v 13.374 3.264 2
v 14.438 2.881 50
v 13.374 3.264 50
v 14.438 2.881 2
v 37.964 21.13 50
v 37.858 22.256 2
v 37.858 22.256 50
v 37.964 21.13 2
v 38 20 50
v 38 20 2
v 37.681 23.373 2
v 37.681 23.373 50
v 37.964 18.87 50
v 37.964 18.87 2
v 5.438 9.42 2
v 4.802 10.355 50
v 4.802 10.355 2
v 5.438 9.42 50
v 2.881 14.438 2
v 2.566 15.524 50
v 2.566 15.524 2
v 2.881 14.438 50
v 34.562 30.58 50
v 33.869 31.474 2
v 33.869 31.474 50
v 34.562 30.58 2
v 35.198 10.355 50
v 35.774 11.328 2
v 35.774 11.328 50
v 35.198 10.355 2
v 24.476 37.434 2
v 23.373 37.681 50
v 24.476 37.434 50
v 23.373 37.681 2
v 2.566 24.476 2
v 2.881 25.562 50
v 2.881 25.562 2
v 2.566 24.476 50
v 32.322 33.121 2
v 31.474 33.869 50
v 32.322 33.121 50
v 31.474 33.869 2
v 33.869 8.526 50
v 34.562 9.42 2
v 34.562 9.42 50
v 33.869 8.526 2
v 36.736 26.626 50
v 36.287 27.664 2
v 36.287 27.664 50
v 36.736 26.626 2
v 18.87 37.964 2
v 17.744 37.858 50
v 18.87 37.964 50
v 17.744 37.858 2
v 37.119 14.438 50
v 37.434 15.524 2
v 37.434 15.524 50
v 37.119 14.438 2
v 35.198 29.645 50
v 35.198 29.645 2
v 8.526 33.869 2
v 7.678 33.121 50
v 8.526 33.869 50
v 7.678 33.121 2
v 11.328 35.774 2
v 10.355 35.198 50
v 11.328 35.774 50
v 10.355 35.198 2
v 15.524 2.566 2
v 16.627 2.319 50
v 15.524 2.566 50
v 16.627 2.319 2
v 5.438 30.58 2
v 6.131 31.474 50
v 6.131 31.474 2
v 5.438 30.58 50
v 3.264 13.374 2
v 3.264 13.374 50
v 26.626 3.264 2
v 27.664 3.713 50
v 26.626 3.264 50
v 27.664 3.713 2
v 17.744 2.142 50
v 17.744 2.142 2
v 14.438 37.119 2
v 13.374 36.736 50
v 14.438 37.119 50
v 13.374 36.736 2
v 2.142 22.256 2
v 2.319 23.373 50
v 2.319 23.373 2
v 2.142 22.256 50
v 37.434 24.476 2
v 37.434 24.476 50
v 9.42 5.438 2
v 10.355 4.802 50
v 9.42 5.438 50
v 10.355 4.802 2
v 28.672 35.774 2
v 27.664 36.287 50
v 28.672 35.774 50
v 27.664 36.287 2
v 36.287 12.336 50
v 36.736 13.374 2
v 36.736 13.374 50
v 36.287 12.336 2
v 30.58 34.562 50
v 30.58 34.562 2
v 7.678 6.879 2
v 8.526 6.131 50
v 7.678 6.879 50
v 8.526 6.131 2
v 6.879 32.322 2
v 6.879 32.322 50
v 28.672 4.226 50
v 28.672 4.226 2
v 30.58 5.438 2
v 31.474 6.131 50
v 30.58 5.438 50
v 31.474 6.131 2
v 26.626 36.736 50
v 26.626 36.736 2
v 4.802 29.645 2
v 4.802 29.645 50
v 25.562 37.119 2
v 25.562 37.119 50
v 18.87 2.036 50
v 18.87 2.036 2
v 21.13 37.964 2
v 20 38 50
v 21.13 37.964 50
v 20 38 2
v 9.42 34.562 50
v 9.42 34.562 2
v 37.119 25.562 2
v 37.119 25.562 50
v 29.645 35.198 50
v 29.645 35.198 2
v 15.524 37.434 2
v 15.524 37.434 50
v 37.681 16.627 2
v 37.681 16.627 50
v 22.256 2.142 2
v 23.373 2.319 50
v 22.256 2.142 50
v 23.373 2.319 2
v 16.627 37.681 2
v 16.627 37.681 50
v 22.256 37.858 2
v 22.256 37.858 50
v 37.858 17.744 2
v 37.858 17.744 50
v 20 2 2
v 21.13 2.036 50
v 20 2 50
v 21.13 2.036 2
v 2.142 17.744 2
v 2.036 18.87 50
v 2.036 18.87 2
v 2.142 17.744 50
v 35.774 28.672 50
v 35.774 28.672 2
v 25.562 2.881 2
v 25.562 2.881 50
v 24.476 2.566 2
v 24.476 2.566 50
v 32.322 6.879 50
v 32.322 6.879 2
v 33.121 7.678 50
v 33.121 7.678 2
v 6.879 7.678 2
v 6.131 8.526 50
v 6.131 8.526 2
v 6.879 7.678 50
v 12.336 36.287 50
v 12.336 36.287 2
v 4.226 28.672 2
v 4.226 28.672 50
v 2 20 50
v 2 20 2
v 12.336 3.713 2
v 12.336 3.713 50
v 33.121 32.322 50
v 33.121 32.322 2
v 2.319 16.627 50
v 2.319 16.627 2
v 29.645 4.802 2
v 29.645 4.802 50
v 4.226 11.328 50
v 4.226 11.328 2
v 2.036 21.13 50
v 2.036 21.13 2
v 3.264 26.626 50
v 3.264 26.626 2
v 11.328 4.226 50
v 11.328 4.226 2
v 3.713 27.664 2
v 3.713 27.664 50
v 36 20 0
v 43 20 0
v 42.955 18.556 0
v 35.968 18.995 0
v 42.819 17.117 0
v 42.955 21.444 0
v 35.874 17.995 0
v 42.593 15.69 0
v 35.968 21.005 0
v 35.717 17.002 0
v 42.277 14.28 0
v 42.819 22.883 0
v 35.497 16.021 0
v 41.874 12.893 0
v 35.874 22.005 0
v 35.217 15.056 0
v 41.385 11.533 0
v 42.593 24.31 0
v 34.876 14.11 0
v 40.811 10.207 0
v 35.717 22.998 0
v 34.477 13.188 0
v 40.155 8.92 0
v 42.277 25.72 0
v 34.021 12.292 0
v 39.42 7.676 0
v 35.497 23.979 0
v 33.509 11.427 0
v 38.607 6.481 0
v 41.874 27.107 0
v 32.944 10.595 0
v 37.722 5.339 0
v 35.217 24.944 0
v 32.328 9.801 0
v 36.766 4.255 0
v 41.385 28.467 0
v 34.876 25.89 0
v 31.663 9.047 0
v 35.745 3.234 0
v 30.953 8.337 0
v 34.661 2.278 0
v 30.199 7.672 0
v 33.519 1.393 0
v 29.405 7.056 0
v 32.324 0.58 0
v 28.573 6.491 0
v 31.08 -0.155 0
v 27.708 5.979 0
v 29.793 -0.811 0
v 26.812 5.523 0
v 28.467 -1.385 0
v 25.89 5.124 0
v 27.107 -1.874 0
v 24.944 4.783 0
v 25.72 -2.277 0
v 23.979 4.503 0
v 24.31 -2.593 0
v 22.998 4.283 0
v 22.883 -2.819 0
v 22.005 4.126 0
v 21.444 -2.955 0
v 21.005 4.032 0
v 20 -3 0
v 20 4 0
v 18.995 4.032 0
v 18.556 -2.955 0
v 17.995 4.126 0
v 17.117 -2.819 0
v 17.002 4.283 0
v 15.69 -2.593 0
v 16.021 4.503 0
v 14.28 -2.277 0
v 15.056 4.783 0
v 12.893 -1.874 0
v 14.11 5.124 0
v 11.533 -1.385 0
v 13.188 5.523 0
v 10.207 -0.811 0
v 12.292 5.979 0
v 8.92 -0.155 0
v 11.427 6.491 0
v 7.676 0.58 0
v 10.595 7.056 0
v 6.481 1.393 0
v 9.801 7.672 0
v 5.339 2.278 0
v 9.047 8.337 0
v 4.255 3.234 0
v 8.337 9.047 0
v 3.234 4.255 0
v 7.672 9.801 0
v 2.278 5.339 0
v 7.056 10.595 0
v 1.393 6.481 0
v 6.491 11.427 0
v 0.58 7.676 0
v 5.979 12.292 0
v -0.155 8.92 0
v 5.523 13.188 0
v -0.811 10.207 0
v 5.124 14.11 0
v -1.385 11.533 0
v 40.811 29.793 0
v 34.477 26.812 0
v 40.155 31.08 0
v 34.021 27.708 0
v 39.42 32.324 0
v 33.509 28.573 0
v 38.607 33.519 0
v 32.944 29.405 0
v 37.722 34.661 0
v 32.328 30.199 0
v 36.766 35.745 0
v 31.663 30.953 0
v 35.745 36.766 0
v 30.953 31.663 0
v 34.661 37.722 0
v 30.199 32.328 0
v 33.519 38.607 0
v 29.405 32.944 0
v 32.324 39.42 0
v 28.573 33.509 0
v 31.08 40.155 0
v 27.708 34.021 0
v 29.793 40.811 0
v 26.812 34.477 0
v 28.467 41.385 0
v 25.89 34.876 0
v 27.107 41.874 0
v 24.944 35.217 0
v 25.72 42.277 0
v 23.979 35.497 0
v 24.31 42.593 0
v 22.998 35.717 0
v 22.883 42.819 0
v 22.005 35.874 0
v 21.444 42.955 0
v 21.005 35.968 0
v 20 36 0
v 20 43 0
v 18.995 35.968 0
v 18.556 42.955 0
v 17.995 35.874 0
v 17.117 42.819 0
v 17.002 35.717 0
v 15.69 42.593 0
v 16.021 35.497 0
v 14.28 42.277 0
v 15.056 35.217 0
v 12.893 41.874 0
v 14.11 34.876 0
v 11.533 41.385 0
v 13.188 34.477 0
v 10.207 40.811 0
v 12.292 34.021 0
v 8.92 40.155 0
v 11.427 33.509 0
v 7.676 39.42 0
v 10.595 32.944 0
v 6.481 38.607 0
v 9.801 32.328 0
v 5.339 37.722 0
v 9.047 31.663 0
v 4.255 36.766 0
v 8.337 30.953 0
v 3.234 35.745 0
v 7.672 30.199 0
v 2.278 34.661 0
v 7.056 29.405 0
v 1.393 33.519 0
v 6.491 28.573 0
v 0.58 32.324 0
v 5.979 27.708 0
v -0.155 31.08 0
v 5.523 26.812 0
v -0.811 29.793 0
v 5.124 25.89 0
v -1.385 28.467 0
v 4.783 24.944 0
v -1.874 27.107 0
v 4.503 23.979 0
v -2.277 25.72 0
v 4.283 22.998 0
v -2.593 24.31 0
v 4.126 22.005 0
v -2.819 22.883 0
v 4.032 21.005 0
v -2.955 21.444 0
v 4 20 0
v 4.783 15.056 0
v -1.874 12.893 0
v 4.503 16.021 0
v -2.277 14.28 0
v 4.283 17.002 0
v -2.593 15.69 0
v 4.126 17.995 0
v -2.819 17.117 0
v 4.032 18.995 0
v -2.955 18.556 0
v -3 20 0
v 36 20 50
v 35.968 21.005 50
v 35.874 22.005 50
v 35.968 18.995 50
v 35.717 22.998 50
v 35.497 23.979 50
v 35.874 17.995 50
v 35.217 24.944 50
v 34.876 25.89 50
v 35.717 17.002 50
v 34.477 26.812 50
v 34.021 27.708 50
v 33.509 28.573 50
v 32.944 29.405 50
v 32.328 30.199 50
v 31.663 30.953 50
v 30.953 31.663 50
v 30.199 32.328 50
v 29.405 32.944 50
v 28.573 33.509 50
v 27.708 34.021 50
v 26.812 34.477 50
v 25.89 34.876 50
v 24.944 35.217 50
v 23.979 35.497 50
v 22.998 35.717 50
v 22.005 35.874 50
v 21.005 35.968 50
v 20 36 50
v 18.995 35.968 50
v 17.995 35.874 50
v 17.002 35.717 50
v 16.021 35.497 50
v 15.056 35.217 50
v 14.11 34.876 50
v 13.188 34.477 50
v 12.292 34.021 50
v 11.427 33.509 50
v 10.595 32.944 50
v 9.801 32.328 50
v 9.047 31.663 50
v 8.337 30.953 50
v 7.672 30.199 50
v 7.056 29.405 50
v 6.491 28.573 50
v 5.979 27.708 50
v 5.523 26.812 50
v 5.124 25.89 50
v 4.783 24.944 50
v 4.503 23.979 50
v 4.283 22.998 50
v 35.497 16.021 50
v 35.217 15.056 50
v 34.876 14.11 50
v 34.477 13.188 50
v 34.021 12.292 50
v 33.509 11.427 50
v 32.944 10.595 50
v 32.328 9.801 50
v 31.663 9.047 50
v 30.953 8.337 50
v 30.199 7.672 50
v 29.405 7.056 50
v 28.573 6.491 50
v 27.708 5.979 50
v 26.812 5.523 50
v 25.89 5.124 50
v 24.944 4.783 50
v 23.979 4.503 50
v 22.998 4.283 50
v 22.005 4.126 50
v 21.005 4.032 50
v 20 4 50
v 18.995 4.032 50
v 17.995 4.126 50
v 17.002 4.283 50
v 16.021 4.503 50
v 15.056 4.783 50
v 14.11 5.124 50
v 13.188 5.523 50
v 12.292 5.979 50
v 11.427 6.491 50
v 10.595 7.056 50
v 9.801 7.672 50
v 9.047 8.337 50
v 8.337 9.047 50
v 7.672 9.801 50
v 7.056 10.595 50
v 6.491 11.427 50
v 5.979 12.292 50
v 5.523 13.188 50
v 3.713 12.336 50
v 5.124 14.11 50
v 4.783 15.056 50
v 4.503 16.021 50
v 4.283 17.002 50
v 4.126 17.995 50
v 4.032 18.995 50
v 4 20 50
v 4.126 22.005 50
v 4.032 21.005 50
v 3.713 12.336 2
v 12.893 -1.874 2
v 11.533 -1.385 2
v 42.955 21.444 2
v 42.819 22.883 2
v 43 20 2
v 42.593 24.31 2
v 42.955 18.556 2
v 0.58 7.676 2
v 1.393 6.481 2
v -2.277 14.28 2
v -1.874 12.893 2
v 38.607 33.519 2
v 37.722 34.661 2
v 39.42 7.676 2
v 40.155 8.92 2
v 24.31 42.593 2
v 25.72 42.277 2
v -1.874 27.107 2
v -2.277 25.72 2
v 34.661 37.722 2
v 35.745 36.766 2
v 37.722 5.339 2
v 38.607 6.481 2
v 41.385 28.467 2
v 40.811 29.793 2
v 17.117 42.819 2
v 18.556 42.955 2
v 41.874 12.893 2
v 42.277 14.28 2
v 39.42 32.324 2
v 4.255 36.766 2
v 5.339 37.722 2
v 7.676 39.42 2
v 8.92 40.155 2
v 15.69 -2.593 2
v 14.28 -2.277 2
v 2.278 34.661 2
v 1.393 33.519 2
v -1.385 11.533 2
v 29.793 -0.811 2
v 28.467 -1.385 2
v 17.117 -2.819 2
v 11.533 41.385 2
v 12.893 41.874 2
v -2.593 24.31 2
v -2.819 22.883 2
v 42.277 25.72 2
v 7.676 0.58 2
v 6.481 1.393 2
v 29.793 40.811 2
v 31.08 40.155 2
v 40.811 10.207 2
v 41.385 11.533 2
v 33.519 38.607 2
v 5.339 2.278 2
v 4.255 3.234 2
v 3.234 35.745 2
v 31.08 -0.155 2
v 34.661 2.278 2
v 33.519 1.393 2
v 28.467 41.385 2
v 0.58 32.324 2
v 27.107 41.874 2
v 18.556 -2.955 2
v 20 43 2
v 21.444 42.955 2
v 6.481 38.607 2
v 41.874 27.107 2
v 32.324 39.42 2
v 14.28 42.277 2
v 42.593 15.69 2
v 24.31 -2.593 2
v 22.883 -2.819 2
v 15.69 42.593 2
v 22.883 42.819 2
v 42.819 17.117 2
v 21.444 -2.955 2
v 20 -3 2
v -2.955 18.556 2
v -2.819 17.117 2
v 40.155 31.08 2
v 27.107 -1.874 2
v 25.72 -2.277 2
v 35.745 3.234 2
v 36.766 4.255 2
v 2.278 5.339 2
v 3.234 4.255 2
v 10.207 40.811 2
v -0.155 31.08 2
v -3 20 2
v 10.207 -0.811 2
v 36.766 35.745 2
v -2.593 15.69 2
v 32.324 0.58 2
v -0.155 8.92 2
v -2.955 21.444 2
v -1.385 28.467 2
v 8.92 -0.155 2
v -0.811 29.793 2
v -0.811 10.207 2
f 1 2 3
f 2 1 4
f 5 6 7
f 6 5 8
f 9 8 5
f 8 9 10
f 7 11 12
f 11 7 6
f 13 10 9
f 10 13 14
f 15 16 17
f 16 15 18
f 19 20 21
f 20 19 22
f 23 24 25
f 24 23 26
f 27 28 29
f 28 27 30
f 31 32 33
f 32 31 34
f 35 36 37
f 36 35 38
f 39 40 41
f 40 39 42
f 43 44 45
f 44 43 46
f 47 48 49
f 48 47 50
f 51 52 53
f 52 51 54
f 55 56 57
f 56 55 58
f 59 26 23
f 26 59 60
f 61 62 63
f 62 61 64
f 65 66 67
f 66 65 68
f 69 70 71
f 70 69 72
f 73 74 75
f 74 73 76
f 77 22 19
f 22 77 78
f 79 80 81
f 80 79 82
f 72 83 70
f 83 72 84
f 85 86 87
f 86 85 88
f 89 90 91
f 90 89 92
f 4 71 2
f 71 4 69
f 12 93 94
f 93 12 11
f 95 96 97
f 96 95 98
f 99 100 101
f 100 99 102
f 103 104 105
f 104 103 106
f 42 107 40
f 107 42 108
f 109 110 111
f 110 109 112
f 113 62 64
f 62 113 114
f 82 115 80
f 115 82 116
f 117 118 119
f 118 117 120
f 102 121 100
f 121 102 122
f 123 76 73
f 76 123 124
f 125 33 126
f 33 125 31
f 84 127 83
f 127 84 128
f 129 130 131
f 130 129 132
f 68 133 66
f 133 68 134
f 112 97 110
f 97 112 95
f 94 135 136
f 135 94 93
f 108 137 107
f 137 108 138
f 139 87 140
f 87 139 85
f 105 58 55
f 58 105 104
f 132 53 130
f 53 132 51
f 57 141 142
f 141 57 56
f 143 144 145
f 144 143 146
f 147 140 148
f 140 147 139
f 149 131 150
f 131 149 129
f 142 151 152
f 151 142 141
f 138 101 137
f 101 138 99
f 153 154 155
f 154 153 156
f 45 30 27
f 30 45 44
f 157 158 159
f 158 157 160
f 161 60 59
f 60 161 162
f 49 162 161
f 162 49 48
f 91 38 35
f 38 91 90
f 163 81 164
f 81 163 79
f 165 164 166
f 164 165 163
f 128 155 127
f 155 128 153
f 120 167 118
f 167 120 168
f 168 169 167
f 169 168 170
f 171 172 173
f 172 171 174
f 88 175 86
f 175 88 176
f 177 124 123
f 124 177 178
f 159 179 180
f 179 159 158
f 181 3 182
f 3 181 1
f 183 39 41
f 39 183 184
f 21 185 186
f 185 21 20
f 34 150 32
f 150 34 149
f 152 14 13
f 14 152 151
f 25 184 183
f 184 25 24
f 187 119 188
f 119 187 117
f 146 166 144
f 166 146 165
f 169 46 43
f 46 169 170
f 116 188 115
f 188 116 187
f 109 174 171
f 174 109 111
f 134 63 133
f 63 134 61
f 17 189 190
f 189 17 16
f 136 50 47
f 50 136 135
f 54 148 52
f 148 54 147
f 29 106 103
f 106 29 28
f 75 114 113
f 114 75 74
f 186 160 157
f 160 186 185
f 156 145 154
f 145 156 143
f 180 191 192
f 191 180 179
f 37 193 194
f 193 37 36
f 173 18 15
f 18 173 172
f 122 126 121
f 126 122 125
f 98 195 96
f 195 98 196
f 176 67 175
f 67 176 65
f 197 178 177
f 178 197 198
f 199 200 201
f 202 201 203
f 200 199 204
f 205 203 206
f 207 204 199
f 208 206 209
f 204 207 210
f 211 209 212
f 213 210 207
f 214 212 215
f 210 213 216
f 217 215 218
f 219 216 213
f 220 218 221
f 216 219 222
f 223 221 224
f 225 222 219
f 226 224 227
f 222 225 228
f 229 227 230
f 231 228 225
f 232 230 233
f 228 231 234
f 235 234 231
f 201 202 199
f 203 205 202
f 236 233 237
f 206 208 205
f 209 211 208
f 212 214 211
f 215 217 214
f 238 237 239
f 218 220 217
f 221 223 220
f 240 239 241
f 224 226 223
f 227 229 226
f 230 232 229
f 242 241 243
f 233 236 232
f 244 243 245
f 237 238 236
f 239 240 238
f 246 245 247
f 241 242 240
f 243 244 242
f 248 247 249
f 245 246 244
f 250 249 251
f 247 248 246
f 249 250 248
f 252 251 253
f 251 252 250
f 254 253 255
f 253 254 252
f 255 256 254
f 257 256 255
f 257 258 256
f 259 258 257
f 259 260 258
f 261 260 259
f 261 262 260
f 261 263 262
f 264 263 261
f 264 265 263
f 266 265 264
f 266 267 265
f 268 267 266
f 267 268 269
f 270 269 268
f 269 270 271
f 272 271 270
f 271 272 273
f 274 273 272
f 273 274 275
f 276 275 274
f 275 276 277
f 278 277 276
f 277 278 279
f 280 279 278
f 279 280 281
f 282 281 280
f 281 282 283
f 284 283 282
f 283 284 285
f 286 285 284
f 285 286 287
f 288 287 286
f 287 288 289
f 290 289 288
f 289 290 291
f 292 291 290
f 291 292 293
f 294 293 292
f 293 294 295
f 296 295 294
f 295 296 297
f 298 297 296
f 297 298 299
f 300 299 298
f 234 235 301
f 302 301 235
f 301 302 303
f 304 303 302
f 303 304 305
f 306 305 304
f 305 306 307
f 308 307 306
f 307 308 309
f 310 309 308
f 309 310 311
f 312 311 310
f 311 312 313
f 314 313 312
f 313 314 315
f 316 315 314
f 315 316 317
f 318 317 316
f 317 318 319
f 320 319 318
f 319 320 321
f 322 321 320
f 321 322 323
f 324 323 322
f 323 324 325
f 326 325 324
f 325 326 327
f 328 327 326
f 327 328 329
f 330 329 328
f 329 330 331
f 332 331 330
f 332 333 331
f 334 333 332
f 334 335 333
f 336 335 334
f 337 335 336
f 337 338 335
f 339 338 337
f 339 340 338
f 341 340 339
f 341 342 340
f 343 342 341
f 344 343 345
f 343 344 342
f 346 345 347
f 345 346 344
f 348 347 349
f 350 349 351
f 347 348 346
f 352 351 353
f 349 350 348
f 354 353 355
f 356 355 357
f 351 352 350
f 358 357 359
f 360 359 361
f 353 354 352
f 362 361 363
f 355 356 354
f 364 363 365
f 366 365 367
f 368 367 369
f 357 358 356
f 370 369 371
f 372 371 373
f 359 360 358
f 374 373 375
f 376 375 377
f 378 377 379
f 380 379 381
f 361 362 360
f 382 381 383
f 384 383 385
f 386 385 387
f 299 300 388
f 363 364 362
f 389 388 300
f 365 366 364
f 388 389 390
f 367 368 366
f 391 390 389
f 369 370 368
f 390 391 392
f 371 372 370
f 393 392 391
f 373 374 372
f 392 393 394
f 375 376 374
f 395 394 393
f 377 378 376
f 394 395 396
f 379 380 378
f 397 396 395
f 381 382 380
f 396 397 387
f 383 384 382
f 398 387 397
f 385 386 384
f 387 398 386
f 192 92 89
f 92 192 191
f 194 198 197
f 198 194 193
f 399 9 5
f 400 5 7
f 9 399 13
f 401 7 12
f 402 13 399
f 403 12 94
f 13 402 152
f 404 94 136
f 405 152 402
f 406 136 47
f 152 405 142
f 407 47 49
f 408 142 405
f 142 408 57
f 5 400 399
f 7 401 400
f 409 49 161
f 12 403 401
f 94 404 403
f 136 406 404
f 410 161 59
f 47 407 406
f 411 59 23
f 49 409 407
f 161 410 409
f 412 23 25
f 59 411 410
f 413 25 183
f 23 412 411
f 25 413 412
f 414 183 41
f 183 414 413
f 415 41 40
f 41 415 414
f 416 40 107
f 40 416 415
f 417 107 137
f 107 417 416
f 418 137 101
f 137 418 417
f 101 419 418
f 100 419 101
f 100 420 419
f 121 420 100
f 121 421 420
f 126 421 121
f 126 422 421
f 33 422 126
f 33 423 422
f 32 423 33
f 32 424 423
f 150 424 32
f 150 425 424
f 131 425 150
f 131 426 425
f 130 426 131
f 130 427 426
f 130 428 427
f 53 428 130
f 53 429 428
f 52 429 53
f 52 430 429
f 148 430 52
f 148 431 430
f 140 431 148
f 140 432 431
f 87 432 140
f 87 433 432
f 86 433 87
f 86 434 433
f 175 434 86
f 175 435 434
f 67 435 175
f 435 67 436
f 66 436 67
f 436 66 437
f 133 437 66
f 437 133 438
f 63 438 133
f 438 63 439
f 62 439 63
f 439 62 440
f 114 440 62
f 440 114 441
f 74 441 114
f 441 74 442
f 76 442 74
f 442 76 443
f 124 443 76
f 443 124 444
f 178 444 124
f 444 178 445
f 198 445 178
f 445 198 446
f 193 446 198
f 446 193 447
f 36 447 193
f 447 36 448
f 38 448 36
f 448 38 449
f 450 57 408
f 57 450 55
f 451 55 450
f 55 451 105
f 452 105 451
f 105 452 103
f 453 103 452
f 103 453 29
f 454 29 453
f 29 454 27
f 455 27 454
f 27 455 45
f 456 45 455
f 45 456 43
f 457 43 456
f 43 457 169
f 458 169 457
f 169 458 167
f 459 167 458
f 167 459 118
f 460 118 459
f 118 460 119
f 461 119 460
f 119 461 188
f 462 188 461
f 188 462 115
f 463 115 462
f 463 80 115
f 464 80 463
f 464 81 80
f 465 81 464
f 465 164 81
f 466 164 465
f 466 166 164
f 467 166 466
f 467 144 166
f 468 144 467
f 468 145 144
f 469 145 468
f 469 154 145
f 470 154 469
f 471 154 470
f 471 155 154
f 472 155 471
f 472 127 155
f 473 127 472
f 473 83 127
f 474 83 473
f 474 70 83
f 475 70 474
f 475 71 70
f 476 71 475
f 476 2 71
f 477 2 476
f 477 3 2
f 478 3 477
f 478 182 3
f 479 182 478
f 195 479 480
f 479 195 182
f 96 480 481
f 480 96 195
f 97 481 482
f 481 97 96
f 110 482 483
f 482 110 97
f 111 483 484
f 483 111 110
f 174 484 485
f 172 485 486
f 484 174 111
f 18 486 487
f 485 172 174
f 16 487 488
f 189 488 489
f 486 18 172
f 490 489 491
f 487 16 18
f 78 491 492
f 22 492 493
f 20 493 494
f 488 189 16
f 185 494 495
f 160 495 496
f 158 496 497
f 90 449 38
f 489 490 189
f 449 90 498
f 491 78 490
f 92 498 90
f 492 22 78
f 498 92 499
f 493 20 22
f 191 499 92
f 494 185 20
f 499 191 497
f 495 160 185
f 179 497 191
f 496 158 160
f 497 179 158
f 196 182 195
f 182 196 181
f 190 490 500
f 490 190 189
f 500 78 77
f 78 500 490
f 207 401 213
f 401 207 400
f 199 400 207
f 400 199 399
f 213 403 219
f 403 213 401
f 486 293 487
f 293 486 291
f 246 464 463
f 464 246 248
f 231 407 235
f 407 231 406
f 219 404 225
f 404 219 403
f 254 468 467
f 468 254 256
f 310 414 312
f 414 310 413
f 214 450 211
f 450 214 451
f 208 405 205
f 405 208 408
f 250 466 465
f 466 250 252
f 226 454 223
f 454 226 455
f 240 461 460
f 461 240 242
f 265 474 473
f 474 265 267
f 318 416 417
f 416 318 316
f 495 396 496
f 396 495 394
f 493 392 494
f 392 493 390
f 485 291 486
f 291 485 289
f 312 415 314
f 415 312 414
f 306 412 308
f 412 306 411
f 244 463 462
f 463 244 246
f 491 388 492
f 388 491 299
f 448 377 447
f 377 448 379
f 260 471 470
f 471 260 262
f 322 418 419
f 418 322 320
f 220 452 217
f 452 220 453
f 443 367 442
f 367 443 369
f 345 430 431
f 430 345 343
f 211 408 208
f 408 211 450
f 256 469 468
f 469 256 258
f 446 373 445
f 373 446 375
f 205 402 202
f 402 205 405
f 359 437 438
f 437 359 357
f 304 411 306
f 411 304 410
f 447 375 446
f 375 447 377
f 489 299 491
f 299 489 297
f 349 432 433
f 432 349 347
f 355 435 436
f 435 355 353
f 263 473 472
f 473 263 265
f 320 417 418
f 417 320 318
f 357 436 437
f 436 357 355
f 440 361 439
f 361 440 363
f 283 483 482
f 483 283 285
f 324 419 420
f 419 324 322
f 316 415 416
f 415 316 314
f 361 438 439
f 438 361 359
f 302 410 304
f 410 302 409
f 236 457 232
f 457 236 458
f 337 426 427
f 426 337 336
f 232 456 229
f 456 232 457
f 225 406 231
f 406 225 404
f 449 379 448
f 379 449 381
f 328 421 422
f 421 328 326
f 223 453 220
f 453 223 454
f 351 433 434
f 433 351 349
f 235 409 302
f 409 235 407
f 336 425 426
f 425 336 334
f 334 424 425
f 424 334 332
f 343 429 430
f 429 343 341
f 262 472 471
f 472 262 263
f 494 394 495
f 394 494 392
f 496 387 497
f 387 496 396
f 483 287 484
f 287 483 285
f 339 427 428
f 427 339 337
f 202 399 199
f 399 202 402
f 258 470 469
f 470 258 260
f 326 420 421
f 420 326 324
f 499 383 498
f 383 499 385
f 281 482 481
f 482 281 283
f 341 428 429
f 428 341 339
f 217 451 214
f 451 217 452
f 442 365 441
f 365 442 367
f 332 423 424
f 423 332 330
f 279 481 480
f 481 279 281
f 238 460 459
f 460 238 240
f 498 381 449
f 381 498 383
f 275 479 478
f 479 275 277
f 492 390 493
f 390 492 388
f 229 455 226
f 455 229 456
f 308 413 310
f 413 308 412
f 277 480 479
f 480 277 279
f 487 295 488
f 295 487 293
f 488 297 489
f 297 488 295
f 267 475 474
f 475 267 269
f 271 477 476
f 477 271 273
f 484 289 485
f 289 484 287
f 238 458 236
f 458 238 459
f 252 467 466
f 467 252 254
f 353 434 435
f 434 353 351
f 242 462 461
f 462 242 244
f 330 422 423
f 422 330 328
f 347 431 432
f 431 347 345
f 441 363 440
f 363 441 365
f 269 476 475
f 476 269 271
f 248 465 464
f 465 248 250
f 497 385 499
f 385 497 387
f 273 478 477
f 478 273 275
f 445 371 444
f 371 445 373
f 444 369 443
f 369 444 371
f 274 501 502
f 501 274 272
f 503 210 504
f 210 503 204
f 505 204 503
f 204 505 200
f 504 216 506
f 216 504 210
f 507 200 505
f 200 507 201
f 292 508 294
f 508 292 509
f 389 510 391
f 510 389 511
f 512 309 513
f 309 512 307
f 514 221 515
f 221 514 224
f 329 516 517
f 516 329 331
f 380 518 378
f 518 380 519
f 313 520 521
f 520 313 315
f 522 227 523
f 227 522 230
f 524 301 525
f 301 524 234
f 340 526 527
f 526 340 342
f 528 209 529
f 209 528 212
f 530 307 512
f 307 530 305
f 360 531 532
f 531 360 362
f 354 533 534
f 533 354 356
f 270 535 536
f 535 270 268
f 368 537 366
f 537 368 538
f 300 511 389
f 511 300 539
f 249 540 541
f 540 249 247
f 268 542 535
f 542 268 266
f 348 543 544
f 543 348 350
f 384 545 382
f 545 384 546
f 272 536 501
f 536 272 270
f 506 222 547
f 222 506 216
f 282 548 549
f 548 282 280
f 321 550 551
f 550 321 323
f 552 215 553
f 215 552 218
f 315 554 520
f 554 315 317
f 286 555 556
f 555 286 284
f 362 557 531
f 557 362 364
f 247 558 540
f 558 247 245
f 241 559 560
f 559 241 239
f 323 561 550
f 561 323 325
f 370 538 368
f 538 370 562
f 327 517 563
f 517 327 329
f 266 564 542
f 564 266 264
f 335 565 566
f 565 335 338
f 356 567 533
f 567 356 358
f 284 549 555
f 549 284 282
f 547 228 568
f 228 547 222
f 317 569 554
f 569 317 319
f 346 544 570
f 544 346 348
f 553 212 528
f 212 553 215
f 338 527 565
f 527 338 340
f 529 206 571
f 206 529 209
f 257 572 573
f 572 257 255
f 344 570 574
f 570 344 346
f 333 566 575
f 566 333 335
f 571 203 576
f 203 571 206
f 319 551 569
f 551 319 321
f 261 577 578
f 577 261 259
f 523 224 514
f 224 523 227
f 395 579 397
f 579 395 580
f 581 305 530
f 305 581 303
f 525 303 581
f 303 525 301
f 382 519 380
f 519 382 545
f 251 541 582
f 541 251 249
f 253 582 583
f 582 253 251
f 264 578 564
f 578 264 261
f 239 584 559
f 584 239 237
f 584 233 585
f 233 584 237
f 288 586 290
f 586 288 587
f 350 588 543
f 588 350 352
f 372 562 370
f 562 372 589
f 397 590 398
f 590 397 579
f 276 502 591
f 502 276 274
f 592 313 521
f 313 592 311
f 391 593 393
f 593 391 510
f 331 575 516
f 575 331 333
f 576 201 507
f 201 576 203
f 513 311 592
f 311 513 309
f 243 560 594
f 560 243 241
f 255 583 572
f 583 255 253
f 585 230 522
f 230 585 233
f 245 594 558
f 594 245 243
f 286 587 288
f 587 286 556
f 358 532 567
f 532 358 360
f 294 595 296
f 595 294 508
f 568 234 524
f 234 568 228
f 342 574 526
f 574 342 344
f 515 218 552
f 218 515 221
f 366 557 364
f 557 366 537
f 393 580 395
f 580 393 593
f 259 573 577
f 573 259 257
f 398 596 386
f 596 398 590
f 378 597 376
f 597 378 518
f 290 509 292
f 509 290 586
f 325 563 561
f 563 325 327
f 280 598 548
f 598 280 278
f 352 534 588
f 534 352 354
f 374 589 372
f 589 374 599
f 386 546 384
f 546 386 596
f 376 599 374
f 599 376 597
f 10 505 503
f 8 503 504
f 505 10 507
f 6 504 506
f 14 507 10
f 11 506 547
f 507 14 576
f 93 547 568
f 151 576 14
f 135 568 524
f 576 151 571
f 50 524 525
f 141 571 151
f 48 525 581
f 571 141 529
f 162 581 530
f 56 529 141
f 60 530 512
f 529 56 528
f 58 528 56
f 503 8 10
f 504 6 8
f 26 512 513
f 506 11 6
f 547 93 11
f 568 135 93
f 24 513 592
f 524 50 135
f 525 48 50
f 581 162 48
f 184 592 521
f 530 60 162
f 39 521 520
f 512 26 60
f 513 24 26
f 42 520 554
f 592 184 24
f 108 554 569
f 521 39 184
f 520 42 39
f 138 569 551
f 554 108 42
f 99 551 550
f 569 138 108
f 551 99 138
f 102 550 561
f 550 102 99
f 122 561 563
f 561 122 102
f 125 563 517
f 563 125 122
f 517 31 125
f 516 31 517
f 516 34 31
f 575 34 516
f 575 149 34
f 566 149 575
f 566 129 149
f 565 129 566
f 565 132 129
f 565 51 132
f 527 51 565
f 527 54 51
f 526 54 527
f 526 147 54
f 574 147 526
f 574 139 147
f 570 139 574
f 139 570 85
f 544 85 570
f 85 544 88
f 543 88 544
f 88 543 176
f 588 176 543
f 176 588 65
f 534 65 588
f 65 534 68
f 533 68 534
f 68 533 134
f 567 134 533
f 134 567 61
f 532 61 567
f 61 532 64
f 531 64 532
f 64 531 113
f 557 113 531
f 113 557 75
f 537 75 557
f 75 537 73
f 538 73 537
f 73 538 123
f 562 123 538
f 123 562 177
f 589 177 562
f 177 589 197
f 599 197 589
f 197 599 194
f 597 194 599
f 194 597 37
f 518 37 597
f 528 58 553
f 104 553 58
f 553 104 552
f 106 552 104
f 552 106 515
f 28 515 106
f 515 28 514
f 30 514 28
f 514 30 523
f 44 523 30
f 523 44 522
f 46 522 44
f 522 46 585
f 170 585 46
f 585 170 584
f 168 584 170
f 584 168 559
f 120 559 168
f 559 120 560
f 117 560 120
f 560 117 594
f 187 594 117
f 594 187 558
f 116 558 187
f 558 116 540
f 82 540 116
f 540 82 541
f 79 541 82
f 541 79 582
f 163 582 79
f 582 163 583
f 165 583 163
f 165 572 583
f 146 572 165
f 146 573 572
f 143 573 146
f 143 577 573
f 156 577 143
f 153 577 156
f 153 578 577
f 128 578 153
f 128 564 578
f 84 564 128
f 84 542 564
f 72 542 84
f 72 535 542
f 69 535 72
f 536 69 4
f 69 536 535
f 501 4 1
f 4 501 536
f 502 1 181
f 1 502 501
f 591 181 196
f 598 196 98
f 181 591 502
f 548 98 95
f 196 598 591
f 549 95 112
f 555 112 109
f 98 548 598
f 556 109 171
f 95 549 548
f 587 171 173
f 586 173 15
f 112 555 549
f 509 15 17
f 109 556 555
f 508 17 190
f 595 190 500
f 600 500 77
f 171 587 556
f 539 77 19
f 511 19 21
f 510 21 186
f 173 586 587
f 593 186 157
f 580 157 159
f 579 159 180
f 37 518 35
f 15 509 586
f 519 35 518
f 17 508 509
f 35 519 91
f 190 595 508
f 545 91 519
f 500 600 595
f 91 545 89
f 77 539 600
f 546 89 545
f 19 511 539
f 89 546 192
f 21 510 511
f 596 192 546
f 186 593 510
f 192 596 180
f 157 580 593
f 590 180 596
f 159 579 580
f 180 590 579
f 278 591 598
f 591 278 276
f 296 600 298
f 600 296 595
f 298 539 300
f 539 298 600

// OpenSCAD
//Lip
LipRadiusOuter=23;
LipRadiusInner=18;
LipHeight=2;
//matrix
rows = 1;
columns = 1;
LipDiameter = LipRadiusOuter * 2;
ModelSpacing = LipRadiusOuter -20;


CylinderWidth=40;
Seedrows=1;
Seedcolumns=1;
Thickness=2;
CylinderHeight=50;
CellSpacing=2;
CellPad=20;


spokeCount=24;
spokerows=8;
spokeDia=15;
spokeY=2;
wallWidth=2;

union()
{
Tube();
Lip();
}

module Tube()
{
    union()
    {
        for(x = [1:Seedcolumns], Y =[1:Seedrows])
        {
               //translate([(40*x), (40*Y),-1]) color("Blue") cube($fn=100,[35,35,5],center=true)
            translate([(CylinderWidth*(x-1))+CellPad, (CylinderWidth*(Y-1))+CellPad,0])  
            difference()
            {
                color("Green")cylinder($fn=100,CylinderHeight,(CylinderWidth/2)-2,(CylinderWidth/2)-2,center=false);
                translate(0,0,10) cylinder($fn=100,CylinderHeight+2,((CylinderWidth/2)) - (wallWidth+CellSpacing),((CylinderWidth/2))-(wallWidth+CellSpacing),center=false);
            }
        }
    }
}

module Lip()
{
    difference()
    color("Green")
    //translate([LipRadiusOuter/2,LipRadiusOuter/2,0])
    translate([(CylinderWidth*(1-1))+CellPad, (CylinderWidth*(1-1))+CellPad,0])  
    difference()
    {
    cylinder($fn=100, LipHeight, LipRadiusOuter, LipRadiusOuter, false);
    translate([0,0,-1])
    cylinder($fn=100, LipHeight+2, LipRadiusInner, LipRadiusInner, false);    
    }
    //linear_extrude(height = LipHeight+.5){translate([8,-10.5,LipHeight])text("18.1", 2);}
}    

module matrix()
{
    for(x=[1:columns], y=[1:rows])
    {
        //echo(x=x);echo(x=(ModelSpacing*(x) + (LipDiameter*(x-1)))); echo(y=0); echo();
        translate([
            ModelSpacing*(x) + (LipDiameter*(x-1)),
            ModelSpacing*(y) + (LipDiameter*(y-1)),
            0
        ])
        {
            Lip();
        }
    }
}
    
    
